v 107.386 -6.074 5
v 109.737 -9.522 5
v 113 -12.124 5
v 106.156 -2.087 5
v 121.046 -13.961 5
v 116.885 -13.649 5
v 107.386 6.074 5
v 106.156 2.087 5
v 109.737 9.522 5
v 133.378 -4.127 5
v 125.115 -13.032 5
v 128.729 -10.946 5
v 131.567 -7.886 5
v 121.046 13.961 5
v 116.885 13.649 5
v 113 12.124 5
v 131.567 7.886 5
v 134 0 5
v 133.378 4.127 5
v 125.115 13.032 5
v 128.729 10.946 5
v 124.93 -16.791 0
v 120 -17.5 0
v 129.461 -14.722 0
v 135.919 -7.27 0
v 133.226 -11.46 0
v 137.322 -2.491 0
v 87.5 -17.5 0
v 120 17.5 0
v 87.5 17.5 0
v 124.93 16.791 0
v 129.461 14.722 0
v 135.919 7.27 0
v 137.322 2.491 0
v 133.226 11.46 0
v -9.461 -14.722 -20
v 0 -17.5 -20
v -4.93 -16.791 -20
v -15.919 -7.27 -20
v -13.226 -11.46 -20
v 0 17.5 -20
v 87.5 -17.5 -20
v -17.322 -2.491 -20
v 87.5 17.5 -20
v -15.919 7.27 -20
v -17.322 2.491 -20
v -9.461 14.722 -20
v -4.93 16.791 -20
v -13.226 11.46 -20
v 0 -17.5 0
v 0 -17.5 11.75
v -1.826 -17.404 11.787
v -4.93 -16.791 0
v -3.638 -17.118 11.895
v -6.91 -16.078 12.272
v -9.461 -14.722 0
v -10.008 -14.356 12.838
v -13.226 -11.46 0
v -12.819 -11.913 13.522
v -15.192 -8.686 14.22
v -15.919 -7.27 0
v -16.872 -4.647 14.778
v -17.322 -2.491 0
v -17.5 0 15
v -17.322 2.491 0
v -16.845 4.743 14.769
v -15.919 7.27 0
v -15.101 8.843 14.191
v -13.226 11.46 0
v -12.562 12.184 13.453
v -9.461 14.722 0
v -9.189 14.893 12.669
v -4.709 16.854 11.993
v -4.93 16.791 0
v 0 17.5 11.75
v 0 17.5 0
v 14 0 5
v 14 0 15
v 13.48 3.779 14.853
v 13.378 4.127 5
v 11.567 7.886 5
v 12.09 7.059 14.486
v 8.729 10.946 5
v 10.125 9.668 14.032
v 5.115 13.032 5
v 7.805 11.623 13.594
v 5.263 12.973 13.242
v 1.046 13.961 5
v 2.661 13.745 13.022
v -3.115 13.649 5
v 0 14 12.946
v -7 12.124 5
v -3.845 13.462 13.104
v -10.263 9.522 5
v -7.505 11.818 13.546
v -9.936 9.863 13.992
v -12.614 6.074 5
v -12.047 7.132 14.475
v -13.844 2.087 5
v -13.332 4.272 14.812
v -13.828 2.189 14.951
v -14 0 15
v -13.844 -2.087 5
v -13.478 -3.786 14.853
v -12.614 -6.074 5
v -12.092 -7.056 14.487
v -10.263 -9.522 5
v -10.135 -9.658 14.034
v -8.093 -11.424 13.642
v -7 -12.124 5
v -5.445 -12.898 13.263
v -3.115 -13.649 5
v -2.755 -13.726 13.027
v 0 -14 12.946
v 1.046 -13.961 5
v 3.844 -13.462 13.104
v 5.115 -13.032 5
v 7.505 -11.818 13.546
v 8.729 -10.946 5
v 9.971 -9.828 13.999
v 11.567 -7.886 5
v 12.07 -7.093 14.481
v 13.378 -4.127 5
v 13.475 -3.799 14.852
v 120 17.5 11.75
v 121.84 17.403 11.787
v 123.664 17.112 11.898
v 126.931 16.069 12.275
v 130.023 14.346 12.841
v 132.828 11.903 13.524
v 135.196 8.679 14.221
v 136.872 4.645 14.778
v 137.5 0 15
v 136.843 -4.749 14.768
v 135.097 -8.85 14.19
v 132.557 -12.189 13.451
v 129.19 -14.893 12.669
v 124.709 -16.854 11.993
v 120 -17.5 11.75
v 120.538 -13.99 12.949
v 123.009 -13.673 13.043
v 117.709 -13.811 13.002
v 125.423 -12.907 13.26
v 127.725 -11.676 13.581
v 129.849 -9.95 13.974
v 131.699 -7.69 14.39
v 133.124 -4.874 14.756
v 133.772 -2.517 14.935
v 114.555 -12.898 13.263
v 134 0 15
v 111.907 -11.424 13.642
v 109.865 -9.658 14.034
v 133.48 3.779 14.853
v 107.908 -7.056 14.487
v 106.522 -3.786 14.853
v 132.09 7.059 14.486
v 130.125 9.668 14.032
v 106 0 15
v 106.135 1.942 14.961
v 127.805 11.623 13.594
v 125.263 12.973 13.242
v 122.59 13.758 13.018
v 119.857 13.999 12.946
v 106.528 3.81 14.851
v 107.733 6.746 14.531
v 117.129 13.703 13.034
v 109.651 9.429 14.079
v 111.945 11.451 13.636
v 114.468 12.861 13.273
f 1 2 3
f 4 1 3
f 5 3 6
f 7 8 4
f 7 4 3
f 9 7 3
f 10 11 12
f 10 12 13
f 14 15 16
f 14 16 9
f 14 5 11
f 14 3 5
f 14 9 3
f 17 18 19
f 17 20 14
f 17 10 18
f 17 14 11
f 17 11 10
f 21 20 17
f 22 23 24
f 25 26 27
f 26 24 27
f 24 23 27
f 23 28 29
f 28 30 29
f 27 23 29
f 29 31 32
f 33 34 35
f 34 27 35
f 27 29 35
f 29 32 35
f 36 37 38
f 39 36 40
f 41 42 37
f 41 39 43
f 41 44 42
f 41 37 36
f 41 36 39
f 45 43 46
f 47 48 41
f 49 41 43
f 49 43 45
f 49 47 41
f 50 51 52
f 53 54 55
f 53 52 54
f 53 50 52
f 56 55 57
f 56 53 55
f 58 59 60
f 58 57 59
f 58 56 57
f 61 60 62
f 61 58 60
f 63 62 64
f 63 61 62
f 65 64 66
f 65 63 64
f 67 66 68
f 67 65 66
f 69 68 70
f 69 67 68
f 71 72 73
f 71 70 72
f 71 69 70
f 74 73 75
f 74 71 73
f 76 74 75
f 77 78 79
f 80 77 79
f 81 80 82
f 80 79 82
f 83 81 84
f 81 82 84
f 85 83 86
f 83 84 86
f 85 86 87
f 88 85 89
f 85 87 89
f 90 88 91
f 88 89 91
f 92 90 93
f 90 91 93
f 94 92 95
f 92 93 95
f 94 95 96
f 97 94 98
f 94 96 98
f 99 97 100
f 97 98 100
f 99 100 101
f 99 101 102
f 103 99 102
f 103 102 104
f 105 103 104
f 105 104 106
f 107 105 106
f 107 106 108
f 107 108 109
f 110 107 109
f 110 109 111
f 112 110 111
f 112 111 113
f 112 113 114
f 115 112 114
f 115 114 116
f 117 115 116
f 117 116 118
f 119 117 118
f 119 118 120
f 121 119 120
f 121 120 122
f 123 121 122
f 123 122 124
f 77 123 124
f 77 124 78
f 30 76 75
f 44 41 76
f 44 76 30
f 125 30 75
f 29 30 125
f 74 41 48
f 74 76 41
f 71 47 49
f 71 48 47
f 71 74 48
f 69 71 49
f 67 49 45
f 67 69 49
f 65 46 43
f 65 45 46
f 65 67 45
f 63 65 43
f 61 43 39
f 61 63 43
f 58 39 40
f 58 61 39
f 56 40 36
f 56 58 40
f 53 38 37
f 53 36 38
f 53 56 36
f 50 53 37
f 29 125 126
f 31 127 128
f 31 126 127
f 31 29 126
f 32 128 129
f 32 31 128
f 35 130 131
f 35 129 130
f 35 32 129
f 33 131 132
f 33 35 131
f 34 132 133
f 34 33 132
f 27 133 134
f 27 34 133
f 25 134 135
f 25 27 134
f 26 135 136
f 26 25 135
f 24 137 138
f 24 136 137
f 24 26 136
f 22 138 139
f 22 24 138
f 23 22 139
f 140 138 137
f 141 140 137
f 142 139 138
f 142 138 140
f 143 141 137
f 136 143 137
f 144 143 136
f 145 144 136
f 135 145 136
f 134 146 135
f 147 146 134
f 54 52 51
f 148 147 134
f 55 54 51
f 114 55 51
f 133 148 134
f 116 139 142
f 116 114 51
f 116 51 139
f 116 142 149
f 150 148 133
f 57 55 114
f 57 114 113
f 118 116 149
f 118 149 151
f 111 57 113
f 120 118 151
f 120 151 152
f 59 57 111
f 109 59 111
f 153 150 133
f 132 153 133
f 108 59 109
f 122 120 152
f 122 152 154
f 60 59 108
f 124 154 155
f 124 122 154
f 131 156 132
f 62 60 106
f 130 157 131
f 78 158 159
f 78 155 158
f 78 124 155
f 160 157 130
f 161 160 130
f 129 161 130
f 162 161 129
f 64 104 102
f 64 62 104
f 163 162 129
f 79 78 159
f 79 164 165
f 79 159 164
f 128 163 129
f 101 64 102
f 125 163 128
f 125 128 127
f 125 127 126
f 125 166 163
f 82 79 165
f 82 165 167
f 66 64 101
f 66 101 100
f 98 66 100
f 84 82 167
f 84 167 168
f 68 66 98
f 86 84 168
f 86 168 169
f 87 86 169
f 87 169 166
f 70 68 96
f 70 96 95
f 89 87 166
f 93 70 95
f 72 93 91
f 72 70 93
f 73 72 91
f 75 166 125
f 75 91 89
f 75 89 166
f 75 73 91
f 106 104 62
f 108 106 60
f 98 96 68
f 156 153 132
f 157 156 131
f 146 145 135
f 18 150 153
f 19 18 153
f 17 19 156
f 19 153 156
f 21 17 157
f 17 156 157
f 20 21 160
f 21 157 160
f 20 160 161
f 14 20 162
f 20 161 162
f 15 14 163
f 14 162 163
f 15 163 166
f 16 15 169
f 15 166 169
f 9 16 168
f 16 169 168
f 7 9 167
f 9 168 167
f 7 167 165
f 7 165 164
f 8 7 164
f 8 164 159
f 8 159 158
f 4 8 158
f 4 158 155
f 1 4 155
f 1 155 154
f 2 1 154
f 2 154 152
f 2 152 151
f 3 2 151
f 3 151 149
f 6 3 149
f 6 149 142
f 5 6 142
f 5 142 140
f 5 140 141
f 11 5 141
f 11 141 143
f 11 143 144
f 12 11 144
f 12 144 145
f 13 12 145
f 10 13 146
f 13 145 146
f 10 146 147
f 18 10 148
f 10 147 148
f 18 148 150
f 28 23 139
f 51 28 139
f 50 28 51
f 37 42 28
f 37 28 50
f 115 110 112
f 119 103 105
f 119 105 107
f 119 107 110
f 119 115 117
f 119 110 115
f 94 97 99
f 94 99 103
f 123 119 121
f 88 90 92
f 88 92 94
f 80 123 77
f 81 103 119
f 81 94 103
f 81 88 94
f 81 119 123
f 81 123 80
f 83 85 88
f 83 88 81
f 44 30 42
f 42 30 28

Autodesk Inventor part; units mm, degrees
ref_plane "YZ Plane" through (0, 0, 0) normal (1, 0, 0) x (0, 1, 0)
ref_plane "XZ Plane" through (0, 0, 0) normal (0, 1, 0) x (-1, 0, 0)
ref_plane "XY Plane" through (0, 0, 0) normal (0, 0, 1) x (1, 0, 0)
sketch "草圖1" plane through (0, 0, 0) normal (0, 0, 1) x (1, 0, 0)
  circle A0 centre (0, 0) radius 17.5
  circle A1 centre (120, 0) radius 17.5
  line L0 (0, 17.5) -> (120, 17.5)
  line L1 (120, 17.5) -> (120, -17.5)
  line L2 (120, -17.5) -> (0, -17.5)
  line L3 (0, -17.5) -> (0, 17.5)
  dimension "d0" = 35
  dimension "d1" = 35
  dimension "d4" = 120
  dimension "d5" = 35
extrude "擠出1" add sketch "草圖1" along normal blind 15
sketch "草圖2" plane through (0, 0, 15) normal (0, 0, 1) x (1, 0, 0)
  circle A0 centre (0, 0) radius 14
  arc A1 (120, -17.5) -> (120, 17.5) centre (120, 0) ccw projected
  circle A2 centre (120, 0) radius 14
  dimension "d6" = 28
  dimension "d7" = 28
extrude "擠出2" cut sketch "草圖2" against normal blind 10
sketch "草圖3" plane through (0, 0, 0) normal (1, 0, 0) x (0, 1, 0)
  circle A0 centre (0, -33.7441) radius 48.7441
  point P0 (0, 0)
extrude "擠出3" cut sketch "草圖3" along normal through all both and the other way through all keep common part
sketch "草圖5" plane through (0, 0, 0) normal (0, 0, -1) x (-1, 0, 0)
  circle A0 centre (0, 0) radius 14 projected
  line L0 (0, 17.5) -> (-120, 17.5) projected
  arc A1 (-120, 17.5) -> (-120, -17.5) centre (-120, 0) ccw projected
  line L1 (-120, -17.5) -> (0, -17.5) projected
  arc A2 (0, -17.5) -> (0, 17.5) centre (0, 0) ccw projected
  line L2 (0, 17.5) -> (-120, 17.5) projected
  line L3 (-87.5, 17.5) -> (-87.5, -17.5)
  line L4 (-120, -17.5) -> (0, -17.5) projected
  dimension "d13" = 50
extrude "擠出4" add sketch "草圖5" along normal blind 20 contours A0 | A2 L1 L3 L0
properties part number "第一臂"
